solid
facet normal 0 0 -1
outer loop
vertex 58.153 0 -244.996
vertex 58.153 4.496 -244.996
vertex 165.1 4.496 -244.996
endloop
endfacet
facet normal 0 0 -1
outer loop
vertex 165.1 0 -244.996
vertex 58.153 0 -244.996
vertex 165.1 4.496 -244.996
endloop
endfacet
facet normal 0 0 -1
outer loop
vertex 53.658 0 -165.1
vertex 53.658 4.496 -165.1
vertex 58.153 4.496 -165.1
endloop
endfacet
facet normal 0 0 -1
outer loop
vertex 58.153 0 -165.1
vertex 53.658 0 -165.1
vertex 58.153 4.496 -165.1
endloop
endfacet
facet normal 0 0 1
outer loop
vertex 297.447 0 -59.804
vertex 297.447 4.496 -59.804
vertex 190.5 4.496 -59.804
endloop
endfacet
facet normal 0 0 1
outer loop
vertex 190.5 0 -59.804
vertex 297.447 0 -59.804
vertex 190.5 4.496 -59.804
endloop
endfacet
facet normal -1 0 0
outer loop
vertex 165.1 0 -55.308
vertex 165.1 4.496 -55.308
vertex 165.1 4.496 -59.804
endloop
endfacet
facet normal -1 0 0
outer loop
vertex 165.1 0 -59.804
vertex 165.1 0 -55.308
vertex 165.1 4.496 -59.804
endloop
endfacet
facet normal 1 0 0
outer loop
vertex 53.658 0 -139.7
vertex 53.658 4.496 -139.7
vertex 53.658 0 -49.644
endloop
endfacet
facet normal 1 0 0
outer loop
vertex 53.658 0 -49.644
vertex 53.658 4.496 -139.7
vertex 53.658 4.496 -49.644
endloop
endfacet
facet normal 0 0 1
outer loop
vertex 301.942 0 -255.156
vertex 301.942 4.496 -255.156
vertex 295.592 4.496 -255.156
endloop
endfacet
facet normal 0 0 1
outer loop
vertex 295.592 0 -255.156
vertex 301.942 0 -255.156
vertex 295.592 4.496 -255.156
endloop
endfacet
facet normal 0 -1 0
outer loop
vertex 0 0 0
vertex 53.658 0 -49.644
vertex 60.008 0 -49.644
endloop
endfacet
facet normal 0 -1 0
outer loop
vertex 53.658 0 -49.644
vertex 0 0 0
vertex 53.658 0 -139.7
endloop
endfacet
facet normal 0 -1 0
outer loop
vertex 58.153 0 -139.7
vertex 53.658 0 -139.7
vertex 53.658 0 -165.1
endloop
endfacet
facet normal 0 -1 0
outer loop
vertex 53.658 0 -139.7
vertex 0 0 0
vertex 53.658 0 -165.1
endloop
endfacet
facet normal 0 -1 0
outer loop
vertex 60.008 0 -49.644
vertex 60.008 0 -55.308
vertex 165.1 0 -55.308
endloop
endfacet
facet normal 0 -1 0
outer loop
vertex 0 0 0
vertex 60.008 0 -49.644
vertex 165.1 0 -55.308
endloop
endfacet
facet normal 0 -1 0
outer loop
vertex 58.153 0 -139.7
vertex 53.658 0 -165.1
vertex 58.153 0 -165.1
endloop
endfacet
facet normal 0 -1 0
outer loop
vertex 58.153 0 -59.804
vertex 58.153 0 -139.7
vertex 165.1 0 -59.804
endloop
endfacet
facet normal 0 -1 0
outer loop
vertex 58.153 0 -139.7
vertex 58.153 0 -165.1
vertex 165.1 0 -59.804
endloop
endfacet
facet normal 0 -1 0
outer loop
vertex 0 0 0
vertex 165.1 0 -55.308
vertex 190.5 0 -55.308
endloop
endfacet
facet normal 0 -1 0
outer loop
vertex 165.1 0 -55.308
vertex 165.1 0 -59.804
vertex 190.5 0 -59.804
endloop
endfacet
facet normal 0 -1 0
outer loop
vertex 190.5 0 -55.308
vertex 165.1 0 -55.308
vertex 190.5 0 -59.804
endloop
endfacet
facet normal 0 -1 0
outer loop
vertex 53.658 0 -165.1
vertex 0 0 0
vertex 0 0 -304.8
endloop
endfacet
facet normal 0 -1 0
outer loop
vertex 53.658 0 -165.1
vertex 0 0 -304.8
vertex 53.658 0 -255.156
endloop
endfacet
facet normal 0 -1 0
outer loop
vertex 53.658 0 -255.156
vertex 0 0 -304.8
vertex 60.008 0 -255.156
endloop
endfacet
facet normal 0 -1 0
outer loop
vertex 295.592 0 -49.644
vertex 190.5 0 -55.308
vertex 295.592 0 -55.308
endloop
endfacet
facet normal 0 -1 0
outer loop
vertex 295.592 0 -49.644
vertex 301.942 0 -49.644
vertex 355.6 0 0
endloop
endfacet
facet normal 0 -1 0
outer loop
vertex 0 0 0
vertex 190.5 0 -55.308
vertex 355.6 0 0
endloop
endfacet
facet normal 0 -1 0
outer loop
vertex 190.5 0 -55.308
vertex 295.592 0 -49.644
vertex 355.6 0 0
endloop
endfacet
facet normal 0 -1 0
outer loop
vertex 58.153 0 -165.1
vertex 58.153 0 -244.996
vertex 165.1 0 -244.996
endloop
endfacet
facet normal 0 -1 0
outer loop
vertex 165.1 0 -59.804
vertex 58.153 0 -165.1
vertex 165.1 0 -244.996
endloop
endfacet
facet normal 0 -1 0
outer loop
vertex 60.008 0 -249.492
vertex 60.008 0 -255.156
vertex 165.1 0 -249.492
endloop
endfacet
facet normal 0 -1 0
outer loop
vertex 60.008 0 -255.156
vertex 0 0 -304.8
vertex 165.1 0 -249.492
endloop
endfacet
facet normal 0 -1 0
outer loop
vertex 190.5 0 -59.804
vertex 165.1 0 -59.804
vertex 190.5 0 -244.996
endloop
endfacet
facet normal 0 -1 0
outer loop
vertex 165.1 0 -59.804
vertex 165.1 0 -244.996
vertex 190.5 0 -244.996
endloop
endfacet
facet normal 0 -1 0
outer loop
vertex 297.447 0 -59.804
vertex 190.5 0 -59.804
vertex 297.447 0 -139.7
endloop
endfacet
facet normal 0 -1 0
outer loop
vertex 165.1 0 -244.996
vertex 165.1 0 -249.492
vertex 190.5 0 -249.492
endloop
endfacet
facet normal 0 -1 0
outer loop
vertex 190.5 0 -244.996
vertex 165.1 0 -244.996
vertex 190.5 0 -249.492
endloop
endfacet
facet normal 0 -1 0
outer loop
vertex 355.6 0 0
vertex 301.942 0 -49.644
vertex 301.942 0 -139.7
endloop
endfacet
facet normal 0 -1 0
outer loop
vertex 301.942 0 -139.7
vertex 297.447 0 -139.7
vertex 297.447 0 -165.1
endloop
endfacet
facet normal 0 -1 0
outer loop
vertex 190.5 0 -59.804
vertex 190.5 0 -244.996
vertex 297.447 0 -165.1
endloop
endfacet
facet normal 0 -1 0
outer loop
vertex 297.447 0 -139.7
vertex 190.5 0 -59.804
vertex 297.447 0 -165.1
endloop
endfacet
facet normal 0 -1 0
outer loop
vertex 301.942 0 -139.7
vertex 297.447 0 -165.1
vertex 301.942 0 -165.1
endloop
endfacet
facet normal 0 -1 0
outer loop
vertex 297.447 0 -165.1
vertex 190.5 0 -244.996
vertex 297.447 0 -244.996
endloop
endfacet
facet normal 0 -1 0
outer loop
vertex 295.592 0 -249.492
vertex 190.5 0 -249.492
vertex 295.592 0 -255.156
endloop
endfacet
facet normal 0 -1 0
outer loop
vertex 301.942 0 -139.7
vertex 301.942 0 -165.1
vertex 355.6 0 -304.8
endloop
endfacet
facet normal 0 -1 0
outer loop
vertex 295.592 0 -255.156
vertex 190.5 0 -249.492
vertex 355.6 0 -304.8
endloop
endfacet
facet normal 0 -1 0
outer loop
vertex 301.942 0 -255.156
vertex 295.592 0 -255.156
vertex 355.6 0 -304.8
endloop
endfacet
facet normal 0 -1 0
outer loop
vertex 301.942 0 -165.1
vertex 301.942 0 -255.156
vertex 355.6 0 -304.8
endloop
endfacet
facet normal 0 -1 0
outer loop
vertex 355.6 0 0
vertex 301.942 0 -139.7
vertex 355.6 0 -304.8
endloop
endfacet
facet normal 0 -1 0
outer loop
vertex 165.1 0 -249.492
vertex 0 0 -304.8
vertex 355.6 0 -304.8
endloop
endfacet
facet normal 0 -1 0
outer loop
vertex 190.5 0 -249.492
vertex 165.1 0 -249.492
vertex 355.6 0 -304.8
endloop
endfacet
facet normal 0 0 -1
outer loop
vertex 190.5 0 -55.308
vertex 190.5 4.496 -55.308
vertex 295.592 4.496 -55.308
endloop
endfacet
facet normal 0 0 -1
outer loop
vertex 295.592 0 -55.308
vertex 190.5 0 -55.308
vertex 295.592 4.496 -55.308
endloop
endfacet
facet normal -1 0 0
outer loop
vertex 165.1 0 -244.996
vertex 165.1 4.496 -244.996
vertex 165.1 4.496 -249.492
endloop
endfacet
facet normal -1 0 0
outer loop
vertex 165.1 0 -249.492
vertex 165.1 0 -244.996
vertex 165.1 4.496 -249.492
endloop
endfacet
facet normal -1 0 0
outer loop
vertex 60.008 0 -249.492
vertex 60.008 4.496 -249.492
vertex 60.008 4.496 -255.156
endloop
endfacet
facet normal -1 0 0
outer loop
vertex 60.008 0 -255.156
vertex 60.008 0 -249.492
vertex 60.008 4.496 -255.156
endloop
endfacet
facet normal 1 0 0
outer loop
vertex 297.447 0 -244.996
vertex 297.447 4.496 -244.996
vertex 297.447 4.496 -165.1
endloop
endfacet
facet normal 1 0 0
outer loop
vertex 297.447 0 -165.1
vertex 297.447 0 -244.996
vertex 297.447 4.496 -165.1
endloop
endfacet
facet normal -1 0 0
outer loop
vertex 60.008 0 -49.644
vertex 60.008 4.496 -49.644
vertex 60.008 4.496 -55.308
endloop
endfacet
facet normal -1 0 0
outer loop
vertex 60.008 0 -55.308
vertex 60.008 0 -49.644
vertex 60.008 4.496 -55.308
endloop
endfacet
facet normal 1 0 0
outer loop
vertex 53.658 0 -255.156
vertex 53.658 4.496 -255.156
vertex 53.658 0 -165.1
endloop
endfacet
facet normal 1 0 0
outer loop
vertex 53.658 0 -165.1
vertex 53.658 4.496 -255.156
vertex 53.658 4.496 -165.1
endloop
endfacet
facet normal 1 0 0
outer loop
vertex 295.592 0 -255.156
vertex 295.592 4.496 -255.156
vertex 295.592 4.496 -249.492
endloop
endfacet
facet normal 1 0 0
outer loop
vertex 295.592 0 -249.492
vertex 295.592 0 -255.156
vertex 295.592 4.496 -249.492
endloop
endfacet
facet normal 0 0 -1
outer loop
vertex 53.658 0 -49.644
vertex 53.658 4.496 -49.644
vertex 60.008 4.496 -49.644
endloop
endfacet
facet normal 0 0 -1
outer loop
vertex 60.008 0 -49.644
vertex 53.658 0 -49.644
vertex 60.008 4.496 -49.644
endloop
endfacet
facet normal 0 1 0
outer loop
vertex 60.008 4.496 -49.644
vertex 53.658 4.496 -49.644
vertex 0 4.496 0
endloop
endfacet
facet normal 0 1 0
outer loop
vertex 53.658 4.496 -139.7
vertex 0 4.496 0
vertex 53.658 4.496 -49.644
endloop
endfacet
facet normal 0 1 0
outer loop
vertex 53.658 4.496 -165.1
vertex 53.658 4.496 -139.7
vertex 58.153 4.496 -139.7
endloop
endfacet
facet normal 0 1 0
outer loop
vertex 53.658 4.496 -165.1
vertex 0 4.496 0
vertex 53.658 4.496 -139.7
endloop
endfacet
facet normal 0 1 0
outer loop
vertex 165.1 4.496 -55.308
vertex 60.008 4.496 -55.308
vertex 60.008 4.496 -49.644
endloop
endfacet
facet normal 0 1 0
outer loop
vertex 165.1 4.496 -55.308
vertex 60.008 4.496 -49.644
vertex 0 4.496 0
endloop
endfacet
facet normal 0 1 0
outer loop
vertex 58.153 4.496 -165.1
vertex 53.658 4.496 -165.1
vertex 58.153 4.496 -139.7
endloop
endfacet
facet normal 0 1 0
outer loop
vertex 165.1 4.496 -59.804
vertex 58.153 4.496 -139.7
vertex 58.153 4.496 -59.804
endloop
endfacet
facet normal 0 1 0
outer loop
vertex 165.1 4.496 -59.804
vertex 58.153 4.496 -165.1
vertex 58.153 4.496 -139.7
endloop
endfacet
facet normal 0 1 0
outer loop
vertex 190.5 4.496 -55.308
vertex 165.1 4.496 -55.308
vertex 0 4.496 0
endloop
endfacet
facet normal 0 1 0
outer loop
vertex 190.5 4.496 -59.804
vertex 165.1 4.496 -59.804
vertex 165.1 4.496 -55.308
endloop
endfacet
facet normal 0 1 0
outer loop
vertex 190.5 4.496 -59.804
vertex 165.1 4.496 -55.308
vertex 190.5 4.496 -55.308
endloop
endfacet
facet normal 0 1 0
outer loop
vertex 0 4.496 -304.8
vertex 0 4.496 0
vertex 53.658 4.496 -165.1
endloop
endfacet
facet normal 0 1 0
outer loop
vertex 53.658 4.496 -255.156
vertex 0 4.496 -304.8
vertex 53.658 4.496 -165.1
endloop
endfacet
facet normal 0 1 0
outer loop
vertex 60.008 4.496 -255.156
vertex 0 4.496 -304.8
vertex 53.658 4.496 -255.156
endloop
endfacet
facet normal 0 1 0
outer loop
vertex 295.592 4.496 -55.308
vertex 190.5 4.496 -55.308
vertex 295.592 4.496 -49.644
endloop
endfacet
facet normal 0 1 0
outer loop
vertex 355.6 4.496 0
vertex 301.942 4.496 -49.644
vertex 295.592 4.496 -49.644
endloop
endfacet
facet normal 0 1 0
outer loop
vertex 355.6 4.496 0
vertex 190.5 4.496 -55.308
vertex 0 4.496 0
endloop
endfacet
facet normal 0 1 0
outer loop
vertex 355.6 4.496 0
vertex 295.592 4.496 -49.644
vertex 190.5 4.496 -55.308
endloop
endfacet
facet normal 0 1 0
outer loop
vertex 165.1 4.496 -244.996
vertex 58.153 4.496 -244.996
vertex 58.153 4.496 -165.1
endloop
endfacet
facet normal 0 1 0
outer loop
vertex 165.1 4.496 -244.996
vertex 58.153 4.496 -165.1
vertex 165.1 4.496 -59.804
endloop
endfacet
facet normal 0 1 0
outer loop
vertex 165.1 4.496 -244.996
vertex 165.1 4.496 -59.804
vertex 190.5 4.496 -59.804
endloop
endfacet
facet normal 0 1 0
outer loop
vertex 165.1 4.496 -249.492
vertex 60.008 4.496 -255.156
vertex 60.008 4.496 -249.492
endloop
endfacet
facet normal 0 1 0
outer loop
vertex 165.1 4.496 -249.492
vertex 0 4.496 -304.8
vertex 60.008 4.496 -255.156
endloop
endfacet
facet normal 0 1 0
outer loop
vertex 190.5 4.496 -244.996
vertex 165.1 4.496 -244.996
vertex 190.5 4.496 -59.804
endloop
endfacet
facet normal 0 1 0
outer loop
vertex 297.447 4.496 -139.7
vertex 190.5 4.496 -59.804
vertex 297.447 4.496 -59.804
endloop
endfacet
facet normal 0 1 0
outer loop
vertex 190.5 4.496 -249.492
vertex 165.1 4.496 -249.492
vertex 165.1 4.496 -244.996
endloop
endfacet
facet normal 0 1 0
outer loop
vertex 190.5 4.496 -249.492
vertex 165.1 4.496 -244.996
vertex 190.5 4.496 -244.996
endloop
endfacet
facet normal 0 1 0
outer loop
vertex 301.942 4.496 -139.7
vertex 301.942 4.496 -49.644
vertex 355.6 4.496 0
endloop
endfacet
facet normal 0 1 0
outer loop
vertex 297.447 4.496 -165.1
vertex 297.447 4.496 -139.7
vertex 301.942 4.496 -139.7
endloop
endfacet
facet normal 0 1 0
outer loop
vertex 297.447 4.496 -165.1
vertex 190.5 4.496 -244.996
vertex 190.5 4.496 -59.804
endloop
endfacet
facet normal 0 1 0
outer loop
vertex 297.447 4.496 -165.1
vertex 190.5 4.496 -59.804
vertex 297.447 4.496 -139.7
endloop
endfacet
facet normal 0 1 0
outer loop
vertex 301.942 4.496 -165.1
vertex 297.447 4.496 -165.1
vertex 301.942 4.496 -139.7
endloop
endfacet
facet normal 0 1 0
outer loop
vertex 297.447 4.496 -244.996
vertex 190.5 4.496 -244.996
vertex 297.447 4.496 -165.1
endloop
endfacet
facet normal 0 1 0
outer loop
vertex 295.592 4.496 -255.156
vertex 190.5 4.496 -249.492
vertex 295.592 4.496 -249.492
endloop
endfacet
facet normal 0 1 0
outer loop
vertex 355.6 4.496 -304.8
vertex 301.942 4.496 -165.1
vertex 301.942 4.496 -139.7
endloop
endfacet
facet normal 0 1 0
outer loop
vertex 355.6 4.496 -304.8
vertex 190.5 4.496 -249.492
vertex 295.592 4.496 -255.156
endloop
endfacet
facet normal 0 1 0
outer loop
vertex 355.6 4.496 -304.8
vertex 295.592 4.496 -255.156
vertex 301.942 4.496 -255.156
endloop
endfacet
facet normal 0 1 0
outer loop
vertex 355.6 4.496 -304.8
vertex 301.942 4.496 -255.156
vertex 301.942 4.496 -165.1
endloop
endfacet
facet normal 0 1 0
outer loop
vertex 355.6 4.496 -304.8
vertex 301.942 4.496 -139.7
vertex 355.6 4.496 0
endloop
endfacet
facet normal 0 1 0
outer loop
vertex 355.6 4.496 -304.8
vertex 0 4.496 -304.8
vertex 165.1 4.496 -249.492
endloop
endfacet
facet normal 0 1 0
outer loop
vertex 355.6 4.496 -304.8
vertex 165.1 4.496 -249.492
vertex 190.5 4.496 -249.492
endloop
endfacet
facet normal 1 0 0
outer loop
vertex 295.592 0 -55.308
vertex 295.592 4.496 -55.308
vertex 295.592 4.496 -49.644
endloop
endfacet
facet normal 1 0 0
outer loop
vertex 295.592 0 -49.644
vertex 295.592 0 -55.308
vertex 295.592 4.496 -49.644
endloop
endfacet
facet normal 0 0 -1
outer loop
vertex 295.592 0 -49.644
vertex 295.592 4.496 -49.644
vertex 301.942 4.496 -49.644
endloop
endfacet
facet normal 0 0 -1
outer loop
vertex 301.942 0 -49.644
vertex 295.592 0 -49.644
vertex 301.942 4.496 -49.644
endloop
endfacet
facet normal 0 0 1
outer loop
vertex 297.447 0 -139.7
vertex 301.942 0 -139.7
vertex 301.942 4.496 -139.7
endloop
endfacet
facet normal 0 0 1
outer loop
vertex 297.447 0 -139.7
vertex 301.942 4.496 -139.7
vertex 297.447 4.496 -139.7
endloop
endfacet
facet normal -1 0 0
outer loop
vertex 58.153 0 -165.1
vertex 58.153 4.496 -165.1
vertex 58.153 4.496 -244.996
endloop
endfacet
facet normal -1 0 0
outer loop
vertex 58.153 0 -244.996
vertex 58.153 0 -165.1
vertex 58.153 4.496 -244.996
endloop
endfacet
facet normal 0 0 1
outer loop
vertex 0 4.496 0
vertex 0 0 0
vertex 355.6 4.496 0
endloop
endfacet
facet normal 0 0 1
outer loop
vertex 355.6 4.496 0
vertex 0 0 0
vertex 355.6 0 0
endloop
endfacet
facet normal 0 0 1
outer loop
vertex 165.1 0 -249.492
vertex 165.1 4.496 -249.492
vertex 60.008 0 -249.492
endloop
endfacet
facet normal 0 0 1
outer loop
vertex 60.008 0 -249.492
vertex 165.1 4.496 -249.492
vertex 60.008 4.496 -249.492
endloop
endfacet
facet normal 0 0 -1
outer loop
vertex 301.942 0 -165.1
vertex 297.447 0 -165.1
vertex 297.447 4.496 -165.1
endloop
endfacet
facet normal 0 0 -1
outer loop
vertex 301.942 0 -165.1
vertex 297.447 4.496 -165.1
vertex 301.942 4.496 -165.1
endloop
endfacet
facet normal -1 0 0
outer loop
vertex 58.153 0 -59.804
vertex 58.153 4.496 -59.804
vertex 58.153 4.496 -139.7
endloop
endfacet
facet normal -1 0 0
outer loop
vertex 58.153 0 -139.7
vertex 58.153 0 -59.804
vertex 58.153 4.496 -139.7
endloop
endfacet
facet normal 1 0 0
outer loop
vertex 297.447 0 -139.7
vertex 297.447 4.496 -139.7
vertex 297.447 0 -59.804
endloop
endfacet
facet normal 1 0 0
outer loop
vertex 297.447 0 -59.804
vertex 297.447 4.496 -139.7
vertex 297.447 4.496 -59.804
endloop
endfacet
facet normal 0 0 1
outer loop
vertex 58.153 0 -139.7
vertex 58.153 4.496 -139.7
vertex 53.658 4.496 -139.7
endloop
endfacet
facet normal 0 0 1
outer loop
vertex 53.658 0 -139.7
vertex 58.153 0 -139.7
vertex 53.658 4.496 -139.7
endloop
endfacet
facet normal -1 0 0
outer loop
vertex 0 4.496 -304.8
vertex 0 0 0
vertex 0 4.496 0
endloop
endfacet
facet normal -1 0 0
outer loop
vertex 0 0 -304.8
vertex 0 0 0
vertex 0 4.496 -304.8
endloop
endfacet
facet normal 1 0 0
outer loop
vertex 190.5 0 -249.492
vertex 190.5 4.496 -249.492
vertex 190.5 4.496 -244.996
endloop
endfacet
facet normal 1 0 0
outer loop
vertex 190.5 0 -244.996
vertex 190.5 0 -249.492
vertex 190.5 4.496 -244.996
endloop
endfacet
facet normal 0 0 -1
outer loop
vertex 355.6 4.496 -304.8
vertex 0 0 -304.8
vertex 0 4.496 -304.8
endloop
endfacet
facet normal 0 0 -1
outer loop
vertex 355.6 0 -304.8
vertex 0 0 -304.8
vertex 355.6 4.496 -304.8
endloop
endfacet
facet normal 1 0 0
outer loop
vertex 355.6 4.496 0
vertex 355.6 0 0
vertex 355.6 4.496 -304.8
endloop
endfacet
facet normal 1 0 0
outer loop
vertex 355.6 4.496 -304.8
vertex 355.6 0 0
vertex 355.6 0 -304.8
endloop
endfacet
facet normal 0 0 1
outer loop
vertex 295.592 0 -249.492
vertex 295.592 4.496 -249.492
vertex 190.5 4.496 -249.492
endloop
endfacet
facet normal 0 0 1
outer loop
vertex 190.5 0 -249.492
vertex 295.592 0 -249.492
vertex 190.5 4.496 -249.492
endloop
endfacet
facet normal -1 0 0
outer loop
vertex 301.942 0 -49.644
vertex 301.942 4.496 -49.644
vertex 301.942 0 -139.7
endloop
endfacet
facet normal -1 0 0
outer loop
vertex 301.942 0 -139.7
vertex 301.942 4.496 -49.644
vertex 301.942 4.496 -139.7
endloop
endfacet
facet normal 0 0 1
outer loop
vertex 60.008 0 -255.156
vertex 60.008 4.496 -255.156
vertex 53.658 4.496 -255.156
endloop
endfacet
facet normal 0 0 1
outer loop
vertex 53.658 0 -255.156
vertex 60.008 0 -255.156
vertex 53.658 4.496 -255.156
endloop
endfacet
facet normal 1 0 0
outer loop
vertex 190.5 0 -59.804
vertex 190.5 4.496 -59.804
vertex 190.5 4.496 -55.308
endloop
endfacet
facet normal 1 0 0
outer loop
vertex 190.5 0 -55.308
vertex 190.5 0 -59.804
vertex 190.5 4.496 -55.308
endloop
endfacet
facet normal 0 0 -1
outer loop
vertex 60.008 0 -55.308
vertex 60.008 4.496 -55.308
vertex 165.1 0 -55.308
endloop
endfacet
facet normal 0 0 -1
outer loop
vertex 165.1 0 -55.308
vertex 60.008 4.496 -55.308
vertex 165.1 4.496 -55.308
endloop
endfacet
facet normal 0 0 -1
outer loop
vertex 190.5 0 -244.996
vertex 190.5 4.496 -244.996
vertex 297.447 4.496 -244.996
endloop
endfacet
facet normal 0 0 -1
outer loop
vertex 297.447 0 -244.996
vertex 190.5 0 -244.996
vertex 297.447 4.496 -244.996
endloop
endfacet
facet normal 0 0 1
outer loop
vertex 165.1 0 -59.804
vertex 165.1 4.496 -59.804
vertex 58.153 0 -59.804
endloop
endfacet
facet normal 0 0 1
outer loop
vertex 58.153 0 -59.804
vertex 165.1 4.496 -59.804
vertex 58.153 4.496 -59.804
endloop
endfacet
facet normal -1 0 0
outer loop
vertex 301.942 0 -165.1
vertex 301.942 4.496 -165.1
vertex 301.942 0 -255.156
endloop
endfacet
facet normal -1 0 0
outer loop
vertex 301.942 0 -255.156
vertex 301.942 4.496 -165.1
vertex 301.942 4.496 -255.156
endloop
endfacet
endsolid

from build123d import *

# Parameters (mm, degrees)
SKETCH2_W           = 355.6
SKETCH2_H           = 304.8
BOSS_EXTRUDE1_DEPTH = 4.4958
CUT_EXTRUDE3_DEPTH  = 6.35


with BuildPart() as part:
    # Sketch2 → Boss-Extrude1 (new body)
    with BuildSketch(Plane(origin=(0, 0, 0), x_dir=(1, 0, 0), z_dir=(0, 1, 0))):
        with Locations((177.8, 152.4)):
            Rectangle(SKETCH2_W, SKETCH2_H)
    extrude(amount=BOSS_EXTRUDE1_DEPTH)

    # Sketch3 → Cut-Extrude3 (cut)
    with BuildSketch(Plane(origin=(0, 4.4958, 0), x_dir=(1, 0, 0), z_dir=(0, 1, 0))):
        Polygon((60.0075, 49.6443), (60.0075, 55.3085), (165.1, 55.3085), (165.1, 59.8043), (58.1533, 59.8043), (58.1533, 139.7), (53.6575, 139.7), (53.6575, 49.6443), align=None)
        Polygon((190.5, 59.8043), (190.5, 55.3085), (295.5925, 55.3085), (295.5925, 49.6443), (301.9425, 49.6443), (301.9425, 139.7), (297.4467, 139.7), (297.4467, 59.8043), align=None)
        Polygon((53.6575, 165.1), (58.1533, 165.1), (58.1533, 244.9957), (165.1, 244.9957), (165.1, 249.4915), (60.0075, 249.4915), (60.0075, 255.1557), (53.6575, 255.1557), align=None)
        Polygon((297.4467, 244.9957), (297.4467, 165.1), (301.9425, 165.1), (301.9425, 255.1557), (295.5925, 255.1557), (295.5925, 249.4915), (190.5, 249.4915), (190.5, 244.9957), align=None)
    extrude(amount=-CUT_EXTRUDE3_DEPTH, mode=Mode.SUBTRACT)


solid = part.part
